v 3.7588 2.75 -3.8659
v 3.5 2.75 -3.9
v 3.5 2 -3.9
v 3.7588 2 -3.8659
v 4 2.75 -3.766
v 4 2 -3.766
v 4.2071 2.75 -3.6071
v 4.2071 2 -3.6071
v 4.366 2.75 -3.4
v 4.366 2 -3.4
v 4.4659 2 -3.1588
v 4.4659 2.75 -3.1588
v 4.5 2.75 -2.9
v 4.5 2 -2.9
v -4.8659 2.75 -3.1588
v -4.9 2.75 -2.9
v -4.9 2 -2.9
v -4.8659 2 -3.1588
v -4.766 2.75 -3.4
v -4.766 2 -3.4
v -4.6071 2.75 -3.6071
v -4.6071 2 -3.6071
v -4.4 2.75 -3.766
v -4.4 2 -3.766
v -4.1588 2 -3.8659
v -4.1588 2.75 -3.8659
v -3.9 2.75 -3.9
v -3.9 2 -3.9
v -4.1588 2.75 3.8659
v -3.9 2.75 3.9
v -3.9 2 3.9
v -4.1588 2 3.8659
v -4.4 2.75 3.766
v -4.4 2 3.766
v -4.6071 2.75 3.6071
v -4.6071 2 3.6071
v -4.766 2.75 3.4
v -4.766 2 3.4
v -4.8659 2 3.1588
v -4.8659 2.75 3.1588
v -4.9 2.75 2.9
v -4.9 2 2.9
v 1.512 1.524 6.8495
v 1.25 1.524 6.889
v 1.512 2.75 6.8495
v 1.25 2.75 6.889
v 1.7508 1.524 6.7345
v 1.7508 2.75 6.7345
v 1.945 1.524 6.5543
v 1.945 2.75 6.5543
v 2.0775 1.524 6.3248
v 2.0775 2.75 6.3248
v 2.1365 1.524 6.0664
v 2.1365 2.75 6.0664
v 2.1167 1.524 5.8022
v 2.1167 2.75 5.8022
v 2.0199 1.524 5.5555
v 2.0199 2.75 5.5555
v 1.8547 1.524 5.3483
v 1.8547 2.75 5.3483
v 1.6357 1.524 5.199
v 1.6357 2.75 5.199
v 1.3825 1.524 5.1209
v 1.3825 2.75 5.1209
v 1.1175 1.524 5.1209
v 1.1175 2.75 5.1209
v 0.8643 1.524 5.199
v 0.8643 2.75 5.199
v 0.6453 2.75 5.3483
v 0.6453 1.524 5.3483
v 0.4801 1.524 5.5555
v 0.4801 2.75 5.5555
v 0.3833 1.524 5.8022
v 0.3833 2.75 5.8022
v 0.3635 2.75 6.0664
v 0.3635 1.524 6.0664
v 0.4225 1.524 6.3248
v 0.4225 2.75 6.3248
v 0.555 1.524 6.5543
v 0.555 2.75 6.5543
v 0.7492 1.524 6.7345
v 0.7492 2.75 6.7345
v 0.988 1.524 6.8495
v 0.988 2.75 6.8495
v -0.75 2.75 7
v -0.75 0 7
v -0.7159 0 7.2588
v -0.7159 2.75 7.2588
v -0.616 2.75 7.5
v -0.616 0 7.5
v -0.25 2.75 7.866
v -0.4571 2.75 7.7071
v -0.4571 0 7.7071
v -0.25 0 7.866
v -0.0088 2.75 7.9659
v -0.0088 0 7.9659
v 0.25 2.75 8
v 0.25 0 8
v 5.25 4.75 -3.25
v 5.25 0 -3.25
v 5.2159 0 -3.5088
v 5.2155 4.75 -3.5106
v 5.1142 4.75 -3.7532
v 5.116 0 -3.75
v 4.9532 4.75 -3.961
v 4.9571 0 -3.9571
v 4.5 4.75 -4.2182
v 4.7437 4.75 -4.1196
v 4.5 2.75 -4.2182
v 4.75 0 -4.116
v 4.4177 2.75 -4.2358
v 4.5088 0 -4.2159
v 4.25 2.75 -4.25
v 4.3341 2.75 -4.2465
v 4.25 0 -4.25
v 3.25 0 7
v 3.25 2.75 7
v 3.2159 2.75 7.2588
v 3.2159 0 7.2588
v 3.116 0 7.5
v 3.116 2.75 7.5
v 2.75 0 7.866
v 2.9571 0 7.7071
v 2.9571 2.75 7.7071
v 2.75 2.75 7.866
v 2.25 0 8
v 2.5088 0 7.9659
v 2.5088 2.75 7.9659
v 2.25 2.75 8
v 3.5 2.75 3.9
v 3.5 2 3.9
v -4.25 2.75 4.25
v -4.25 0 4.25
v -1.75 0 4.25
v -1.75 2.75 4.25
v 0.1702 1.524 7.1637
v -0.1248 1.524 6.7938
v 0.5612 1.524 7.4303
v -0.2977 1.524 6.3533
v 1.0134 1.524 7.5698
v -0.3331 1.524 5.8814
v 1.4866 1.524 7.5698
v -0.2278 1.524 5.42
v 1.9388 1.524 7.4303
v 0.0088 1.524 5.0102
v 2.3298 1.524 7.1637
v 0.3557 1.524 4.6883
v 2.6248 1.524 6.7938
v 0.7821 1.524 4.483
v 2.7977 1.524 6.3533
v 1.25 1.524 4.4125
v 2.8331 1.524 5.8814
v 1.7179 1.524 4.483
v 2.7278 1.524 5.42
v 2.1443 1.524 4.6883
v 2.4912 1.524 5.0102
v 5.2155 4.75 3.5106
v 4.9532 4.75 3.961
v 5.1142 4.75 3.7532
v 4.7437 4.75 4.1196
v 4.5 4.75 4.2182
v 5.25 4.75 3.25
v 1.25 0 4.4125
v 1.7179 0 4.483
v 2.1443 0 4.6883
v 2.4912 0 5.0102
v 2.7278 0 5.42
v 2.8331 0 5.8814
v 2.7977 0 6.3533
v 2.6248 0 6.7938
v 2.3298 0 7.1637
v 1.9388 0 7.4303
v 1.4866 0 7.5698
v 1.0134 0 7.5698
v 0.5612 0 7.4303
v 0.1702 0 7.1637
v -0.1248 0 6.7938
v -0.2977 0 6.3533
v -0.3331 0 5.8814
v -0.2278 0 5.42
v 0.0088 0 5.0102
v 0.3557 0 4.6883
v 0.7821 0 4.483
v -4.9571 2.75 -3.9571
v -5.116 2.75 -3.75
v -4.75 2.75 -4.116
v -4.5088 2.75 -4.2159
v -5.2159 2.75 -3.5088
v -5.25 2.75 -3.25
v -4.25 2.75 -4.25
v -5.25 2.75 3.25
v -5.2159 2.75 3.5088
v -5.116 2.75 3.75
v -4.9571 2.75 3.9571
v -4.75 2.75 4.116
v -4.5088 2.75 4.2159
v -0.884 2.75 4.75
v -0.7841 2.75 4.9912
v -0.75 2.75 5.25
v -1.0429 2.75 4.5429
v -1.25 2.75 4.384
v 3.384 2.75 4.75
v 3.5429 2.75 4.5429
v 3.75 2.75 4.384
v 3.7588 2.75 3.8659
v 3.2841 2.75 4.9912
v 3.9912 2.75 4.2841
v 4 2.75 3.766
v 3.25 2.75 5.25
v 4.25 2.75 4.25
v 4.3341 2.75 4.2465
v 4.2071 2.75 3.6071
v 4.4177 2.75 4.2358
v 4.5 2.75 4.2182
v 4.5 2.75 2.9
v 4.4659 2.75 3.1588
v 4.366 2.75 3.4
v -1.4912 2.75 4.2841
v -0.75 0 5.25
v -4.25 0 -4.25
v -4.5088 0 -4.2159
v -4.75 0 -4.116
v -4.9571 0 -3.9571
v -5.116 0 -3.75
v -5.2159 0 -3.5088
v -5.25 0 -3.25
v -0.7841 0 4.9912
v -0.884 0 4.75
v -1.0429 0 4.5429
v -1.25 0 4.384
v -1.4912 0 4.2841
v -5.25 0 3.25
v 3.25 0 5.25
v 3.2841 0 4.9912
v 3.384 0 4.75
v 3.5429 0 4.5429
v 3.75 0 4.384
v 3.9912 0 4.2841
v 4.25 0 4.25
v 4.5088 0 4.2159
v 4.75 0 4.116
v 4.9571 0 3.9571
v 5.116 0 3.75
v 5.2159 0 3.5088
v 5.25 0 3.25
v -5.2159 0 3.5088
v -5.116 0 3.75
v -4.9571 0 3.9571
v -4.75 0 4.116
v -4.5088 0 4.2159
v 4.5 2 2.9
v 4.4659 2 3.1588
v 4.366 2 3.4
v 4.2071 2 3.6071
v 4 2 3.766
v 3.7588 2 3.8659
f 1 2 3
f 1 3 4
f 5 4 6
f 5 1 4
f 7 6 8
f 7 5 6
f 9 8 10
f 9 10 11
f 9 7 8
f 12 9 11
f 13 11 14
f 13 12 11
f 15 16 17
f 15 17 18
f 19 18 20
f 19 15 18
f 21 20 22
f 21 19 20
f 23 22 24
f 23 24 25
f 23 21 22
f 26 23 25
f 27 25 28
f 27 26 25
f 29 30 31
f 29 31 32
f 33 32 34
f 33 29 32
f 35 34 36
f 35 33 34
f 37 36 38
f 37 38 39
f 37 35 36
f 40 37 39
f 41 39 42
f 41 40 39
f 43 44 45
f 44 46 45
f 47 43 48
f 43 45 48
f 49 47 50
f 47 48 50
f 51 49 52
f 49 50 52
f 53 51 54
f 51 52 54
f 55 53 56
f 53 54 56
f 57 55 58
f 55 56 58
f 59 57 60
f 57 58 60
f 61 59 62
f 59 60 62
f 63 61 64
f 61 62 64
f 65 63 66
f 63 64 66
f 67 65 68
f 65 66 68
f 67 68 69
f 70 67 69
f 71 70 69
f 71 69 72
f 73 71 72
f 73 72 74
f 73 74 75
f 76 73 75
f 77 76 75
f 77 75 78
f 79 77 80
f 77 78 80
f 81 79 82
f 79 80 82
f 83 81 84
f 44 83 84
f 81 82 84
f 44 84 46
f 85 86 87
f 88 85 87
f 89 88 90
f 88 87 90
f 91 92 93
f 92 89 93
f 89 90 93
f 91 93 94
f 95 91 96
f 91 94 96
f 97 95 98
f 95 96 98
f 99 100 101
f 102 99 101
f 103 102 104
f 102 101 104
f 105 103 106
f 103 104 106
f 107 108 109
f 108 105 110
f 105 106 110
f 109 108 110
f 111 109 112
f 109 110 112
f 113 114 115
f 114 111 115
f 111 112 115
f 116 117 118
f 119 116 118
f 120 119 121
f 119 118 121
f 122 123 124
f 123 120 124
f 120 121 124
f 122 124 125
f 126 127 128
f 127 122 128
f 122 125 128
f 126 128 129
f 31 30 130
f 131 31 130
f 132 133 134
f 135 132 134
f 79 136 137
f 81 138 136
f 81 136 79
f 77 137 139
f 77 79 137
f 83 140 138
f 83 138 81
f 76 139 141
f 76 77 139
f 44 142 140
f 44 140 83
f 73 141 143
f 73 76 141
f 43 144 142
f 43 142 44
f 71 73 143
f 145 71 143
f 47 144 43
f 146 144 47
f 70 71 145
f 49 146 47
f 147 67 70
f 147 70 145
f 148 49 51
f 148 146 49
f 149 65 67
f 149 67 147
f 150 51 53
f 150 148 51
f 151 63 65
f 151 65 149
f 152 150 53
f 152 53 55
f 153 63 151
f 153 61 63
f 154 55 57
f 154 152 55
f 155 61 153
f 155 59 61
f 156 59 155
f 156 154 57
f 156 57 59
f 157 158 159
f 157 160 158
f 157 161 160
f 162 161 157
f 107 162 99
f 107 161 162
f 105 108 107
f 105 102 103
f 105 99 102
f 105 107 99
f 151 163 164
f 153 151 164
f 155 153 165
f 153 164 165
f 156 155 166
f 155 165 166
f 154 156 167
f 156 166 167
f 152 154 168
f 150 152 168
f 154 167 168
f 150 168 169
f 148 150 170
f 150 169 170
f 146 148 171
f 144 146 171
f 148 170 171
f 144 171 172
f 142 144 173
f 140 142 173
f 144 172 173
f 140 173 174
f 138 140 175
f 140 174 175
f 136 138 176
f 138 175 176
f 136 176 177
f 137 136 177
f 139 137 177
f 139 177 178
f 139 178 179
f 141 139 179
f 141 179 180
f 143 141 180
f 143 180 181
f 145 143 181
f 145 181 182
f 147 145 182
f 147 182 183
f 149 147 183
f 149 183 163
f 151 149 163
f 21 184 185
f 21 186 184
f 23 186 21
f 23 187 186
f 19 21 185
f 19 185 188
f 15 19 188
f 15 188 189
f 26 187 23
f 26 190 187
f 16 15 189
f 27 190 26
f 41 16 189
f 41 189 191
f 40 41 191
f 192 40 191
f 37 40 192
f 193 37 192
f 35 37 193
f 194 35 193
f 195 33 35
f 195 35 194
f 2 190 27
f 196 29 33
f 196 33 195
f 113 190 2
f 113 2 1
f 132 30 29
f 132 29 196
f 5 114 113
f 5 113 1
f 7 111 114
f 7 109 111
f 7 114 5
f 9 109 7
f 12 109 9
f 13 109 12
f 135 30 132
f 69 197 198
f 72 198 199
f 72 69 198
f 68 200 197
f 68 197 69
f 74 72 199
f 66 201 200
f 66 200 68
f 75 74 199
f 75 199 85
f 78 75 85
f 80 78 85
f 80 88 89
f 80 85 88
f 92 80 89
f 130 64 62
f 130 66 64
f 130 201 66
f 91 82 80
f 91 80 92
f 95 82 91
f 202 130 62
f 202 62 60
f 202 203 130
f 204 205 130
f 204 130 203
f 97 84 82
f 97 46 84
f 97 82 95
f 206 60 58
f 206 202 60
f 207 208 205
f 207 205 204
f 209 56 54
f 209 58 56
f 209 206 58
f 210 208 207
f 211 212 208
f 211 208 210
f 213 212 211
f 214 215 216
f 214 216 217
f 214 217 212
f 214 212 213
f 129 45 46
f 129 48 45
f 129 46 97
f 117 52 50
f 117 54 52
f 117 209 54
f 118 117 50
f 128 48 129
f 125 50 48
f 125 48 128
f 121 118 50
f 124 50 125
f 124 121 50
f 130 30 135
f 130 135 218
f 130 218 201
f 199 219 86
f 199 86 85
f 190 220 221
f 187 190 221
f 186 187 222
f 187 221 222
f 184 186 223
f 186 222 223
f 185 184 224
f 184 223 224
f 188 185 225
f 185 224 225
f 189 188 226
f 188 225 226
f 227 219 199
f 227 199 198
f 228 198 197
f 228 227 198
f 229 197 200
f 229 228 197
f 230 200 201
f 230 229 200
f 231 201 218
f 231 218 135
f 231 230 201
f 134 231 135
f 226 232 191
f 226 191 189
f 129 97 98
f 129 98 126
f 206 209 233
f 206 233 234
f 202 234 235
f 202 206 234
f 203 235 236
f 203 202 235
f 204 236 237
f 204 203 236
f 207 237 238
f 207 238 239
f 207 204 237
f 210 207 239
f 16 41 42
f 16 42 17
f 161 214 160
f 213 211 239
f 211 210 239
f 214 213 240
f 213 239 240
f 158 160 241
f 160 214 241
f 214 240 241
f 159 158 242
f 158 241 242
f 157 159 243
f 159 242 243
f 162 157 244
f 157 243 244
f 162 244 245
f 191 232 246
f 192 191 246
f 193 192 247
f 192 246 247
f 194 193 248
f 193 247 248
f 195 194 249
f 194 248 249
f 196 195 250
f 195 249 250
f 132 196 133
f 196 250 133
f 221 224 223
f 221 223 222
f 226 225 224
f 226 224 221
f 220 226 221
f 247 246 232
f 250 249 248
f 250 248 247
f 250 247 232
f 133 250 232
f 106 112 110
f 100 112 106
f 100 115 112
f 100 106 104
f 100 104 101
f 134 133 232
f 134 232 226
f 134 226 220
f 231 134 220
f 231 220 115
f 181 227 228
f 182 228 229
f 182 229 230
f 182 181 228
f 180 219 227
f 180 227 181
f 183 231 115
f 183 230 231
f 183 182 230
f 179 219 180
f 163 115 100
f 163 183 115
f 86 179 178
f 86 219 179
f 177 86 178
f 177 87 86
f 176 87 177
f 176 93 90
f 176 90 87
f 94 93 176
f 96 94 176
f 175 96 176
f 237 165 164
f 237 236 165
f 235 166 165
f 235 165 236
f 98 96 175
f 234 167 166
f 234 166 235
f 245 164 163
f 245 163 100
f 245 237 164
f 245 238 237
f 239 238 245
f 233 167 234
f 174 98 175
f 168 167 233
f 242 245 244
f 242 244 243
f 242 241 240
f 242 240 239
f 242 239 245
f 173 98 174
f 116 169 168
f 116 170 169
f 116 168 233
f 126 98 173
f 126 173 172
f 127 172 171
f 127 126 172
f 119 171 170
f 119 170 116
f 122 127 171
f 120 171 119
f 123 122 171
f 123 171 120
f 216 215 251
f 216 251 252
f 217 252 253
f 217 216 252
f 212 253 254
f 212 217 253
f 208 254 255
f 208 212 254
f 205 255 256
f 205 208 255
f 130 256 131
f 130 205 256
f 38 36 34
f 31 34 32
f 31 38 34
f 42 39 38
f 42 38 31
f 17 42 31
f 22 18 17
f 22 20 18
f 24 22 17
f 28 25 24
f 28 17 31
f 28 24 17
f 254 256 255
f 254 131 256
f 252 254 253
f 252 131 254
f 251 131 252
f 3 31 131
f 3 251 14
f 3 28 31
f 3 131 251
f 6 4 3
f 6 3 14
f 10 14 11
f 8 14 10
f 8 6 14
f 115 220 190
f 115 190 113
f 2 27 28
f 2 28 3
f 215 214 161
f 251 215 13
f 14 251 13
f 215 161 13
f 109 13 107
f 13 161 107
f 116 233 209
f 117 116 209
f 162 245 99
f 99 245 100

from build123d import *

# Parameters (mm, degrees)
SKETCH1_W                                      = 10.5
SKETCH1_H                                      = 8.5
EXTRUDE1_DEPTH                                 = 4.75
SKETCH3_W                                      = 9.75
SKETCH3_H                                      = 8.5
EXTRUDE4_DEPTH                                 = 2
SKETCH4_W                                      = 9.4
SKETCH4_H                                      = 7.8
EXTRUDE5_DEPTH                                 = 0.75
SKETCH5_W                                      = 4
SKETCH5_H                                      = 2.75
EXTRUDE6_DEPTH                                 = 3.75
CBORE_FOR_0_SOCKET_HEAD_CAP_SCREW1_D           = 1.778
CBORE_FOR_0_SOCKET_HEAD_CAP_SCREW1_CBORE_D     = 3.175
CBORE_FOR_0_SOCKET_HEAD_CAP_SCREW1_CBORE_DEPTH = 1.524
FILLET1_R                                      = 1


with BuildPart() as part:
    # Sketch1 → Extrude1 (new body)
    with BuildSketch(Plane(origin=(0, 0, 0), x_dir=(1, 0, 0), z_dir=(0, 1, 0))):
        Rectangle(SKETCH1_W, SKETCH1_H)
    extrude(amount=EXTRUDE1_DEPTH)

    # Sketch3 → Extrude4 (cut)
    with BuildSketch(Plane(origin=(0, 4.75, 0), x_dir=(1, 0, 0), z_dir=(0, 1, 0))):
        with Locations((-0.375, 0)):
            Rectangle(SKETCH3_W, SKETCH3_H)
    extrude(amount=-EXTRUDE4_DEPTH, mode=Mode.SUBTRACT)

    # Sketch4 → Extrude5 (cut)
    with BuildSketch(Plane(origin=(0, 2.75, 0), x_dir=(1, 0, 0), z_dir=(0, 1, 0))):
        with Locations((-0.2, 0)):
            Rectangle(SKETCH4_W, SKETCH4_H)
    extrude(amount=-EXTRUDE5_DEPTH, mode=Mode.SUBTRACT)

    # Sketch5 → Extrude6 (add)
    with BuildSketch(Plane.XY.offset(4.25)):
        with Locations((1.25, 1.375)):
            Rectangle(SKETCH5_W, SKETCH5_H)
    extrude(amount=EXTRUDE6_DEPTH)

    # CBORE for #0 Socket Head Cap Screw1 (through all)
    with Locations(Plane(origin=(1.25, 0, 6), x_dir=(0, 0, -1), z_dir=(0, -1, 0))):
        with Locations((0, 0)):
            CounterBoreHole(CBORE_FOR_0_SOCKET_HEAD_CAP_SCREW1_D / 2, CBORE_FOR_0_SOCKET_HEAD_CAP_SCREW1_CBORE_D / 2, CBORE_FOR_0_SOCKET_HEAD_CAP_SCREW1_CBORE_DEPTH)

    # Fillet1
    # the kernel refuses this fillet: 1 mm, written as the material it adds along each edge
    with BuildSketch(Plane(origin=(3.25, 2.75, 4.25), x_dir=(0, 0, 1), z_dir=(0, -1, 0))) as fillet1_piece_1:
        with BuildLine():
            CenterArc((FILLET1_R, -FILLET1_R), FILLET1_R, 90, 90)
            Line((0, -FILLET1_R), (0, 0))
            Line((0, 0), (FILLET1_R, 0))
        make_face()
    extrude(amount=2.75)
    with BuildSketch(Plane(origin=(-0.75, 0, 4.25), x_dir=(-1, 0, 0), z_dir=(0, 1, 0))) as fillet1_piece_2:
        with BuildLine():
            CenterArc((FILLET1_R, FILLET1_R), FILLET1_R, 180, 90)
            Line((0, FILLET1_R), (0, 0))
            Line((0, 0), (FILLET1_R, 0))
        make_face()
    extrude(amount=2.75)
    with BuildSketch(Plane(origin=(4.5, 2.75, -3.9), x_dir=(0, 0, 1), z_dir=(0, -1, 0)), Plane(origin=(-4.9, 2.75, -3.9), x_dir=(1, 0, 0), z_dir=(0, -1, 0)), Plane(origin=(-4.9, 2.75, 3.9), x_dir=(0, 0, -1), z_dir=(0, -1, 0))) as fillet1_piece_3:
        with BuildLine():
            CenterArc((FILLET1_R, FILLET1_R), FILLET1_R, 180, 90)
            Line((0, FILLET1_R), (0, 0))
            Line((0, 0), (FILLET1_R, 0))
        make_face()
    extrude(amount=0.75)
    with BuildSketch(Plane(origin=(4.5, 2.75, 3.9), x_dir=(0, 0, -1), z_dir=(0, -1, 0))) as fillet1_piece_4:
        with BuildLine():
            CenterArc((FILLET1_R, -FILLET1_R), FILLET1_R, 90, 90)
            Line((0, -FILLET1_R), (0, 0))
            Line((0, 0), (FILLET1_R, 0))
        make_face()
    extrude(amount=0.75)
    # the kernel refuses this fillet: 1 mm, written as the material it takes off along each edge
    with BuildSketch(Plane(origin=(5.25, -2.5, -4.25), x_dir=(-1, 0, 0), z_dir=(0, 1, 0)), Plane(origin=(5.25, -2.5, 4.25), x_dir=(0, 0, -1), z_dir=(0, 1, 0))) as fillet1_2_piece_1:
        with BuildLine():
            CenterArc((FILLET1_R, FILLET1_R), FILLET1_R, 180, 90)
            Line((0, FILLET1_R), (0, 0))
            Line((0, 0), (FILLET1_R, 0))
        make_face()
    extrude(amount=9.75, mode=Mode.SUBTRACT)
    with BuildSketch(Plane(origin=(3.25, 5.25, 8), x_dir=(0, 0, -1), z_dir=(0, -1, 0))) as fillet1_2_piece_2:
        with BuildLine():
            CenterArc((FILLET1_R, -FILLET1_R), FILLET1_R, 90, 90)
            Line((0, -FILLET1_R), (0, 0))
            Line((0, 0), (FILLET1_R, 0))
        make_face()
    extrude(amount=7.75, mode=Mode.SUBTRACT)
    with BuildSketch(Plane(origin=(-0.75, -2.5, 8), x_dir=(1, 0, 0), z_dir=(0, 1, 0)), Plane(origin=(-5.25, -2.5, -4.25), x_dir=(0, 0, 1), z_dir=(0, 1, 0)), Plane(origin=(-5.25, -2.5, 4.25), x_dir=(1, 0, 0), z_dir=(0, 1, 0))) as fillet1_2_piece_3:
        with BuildLine():
            CenterArc((FILLET1_R, FILLET1_R), FILLET1_R, 180, 90)
            Line((0, FILLET1_R), (0, 0))
            Line((0, 0), (FILLET1_R, 0))
        make_face()
    extrude(amount=7.75, mode=Mode.SUBTRACT)


solid = part.part
